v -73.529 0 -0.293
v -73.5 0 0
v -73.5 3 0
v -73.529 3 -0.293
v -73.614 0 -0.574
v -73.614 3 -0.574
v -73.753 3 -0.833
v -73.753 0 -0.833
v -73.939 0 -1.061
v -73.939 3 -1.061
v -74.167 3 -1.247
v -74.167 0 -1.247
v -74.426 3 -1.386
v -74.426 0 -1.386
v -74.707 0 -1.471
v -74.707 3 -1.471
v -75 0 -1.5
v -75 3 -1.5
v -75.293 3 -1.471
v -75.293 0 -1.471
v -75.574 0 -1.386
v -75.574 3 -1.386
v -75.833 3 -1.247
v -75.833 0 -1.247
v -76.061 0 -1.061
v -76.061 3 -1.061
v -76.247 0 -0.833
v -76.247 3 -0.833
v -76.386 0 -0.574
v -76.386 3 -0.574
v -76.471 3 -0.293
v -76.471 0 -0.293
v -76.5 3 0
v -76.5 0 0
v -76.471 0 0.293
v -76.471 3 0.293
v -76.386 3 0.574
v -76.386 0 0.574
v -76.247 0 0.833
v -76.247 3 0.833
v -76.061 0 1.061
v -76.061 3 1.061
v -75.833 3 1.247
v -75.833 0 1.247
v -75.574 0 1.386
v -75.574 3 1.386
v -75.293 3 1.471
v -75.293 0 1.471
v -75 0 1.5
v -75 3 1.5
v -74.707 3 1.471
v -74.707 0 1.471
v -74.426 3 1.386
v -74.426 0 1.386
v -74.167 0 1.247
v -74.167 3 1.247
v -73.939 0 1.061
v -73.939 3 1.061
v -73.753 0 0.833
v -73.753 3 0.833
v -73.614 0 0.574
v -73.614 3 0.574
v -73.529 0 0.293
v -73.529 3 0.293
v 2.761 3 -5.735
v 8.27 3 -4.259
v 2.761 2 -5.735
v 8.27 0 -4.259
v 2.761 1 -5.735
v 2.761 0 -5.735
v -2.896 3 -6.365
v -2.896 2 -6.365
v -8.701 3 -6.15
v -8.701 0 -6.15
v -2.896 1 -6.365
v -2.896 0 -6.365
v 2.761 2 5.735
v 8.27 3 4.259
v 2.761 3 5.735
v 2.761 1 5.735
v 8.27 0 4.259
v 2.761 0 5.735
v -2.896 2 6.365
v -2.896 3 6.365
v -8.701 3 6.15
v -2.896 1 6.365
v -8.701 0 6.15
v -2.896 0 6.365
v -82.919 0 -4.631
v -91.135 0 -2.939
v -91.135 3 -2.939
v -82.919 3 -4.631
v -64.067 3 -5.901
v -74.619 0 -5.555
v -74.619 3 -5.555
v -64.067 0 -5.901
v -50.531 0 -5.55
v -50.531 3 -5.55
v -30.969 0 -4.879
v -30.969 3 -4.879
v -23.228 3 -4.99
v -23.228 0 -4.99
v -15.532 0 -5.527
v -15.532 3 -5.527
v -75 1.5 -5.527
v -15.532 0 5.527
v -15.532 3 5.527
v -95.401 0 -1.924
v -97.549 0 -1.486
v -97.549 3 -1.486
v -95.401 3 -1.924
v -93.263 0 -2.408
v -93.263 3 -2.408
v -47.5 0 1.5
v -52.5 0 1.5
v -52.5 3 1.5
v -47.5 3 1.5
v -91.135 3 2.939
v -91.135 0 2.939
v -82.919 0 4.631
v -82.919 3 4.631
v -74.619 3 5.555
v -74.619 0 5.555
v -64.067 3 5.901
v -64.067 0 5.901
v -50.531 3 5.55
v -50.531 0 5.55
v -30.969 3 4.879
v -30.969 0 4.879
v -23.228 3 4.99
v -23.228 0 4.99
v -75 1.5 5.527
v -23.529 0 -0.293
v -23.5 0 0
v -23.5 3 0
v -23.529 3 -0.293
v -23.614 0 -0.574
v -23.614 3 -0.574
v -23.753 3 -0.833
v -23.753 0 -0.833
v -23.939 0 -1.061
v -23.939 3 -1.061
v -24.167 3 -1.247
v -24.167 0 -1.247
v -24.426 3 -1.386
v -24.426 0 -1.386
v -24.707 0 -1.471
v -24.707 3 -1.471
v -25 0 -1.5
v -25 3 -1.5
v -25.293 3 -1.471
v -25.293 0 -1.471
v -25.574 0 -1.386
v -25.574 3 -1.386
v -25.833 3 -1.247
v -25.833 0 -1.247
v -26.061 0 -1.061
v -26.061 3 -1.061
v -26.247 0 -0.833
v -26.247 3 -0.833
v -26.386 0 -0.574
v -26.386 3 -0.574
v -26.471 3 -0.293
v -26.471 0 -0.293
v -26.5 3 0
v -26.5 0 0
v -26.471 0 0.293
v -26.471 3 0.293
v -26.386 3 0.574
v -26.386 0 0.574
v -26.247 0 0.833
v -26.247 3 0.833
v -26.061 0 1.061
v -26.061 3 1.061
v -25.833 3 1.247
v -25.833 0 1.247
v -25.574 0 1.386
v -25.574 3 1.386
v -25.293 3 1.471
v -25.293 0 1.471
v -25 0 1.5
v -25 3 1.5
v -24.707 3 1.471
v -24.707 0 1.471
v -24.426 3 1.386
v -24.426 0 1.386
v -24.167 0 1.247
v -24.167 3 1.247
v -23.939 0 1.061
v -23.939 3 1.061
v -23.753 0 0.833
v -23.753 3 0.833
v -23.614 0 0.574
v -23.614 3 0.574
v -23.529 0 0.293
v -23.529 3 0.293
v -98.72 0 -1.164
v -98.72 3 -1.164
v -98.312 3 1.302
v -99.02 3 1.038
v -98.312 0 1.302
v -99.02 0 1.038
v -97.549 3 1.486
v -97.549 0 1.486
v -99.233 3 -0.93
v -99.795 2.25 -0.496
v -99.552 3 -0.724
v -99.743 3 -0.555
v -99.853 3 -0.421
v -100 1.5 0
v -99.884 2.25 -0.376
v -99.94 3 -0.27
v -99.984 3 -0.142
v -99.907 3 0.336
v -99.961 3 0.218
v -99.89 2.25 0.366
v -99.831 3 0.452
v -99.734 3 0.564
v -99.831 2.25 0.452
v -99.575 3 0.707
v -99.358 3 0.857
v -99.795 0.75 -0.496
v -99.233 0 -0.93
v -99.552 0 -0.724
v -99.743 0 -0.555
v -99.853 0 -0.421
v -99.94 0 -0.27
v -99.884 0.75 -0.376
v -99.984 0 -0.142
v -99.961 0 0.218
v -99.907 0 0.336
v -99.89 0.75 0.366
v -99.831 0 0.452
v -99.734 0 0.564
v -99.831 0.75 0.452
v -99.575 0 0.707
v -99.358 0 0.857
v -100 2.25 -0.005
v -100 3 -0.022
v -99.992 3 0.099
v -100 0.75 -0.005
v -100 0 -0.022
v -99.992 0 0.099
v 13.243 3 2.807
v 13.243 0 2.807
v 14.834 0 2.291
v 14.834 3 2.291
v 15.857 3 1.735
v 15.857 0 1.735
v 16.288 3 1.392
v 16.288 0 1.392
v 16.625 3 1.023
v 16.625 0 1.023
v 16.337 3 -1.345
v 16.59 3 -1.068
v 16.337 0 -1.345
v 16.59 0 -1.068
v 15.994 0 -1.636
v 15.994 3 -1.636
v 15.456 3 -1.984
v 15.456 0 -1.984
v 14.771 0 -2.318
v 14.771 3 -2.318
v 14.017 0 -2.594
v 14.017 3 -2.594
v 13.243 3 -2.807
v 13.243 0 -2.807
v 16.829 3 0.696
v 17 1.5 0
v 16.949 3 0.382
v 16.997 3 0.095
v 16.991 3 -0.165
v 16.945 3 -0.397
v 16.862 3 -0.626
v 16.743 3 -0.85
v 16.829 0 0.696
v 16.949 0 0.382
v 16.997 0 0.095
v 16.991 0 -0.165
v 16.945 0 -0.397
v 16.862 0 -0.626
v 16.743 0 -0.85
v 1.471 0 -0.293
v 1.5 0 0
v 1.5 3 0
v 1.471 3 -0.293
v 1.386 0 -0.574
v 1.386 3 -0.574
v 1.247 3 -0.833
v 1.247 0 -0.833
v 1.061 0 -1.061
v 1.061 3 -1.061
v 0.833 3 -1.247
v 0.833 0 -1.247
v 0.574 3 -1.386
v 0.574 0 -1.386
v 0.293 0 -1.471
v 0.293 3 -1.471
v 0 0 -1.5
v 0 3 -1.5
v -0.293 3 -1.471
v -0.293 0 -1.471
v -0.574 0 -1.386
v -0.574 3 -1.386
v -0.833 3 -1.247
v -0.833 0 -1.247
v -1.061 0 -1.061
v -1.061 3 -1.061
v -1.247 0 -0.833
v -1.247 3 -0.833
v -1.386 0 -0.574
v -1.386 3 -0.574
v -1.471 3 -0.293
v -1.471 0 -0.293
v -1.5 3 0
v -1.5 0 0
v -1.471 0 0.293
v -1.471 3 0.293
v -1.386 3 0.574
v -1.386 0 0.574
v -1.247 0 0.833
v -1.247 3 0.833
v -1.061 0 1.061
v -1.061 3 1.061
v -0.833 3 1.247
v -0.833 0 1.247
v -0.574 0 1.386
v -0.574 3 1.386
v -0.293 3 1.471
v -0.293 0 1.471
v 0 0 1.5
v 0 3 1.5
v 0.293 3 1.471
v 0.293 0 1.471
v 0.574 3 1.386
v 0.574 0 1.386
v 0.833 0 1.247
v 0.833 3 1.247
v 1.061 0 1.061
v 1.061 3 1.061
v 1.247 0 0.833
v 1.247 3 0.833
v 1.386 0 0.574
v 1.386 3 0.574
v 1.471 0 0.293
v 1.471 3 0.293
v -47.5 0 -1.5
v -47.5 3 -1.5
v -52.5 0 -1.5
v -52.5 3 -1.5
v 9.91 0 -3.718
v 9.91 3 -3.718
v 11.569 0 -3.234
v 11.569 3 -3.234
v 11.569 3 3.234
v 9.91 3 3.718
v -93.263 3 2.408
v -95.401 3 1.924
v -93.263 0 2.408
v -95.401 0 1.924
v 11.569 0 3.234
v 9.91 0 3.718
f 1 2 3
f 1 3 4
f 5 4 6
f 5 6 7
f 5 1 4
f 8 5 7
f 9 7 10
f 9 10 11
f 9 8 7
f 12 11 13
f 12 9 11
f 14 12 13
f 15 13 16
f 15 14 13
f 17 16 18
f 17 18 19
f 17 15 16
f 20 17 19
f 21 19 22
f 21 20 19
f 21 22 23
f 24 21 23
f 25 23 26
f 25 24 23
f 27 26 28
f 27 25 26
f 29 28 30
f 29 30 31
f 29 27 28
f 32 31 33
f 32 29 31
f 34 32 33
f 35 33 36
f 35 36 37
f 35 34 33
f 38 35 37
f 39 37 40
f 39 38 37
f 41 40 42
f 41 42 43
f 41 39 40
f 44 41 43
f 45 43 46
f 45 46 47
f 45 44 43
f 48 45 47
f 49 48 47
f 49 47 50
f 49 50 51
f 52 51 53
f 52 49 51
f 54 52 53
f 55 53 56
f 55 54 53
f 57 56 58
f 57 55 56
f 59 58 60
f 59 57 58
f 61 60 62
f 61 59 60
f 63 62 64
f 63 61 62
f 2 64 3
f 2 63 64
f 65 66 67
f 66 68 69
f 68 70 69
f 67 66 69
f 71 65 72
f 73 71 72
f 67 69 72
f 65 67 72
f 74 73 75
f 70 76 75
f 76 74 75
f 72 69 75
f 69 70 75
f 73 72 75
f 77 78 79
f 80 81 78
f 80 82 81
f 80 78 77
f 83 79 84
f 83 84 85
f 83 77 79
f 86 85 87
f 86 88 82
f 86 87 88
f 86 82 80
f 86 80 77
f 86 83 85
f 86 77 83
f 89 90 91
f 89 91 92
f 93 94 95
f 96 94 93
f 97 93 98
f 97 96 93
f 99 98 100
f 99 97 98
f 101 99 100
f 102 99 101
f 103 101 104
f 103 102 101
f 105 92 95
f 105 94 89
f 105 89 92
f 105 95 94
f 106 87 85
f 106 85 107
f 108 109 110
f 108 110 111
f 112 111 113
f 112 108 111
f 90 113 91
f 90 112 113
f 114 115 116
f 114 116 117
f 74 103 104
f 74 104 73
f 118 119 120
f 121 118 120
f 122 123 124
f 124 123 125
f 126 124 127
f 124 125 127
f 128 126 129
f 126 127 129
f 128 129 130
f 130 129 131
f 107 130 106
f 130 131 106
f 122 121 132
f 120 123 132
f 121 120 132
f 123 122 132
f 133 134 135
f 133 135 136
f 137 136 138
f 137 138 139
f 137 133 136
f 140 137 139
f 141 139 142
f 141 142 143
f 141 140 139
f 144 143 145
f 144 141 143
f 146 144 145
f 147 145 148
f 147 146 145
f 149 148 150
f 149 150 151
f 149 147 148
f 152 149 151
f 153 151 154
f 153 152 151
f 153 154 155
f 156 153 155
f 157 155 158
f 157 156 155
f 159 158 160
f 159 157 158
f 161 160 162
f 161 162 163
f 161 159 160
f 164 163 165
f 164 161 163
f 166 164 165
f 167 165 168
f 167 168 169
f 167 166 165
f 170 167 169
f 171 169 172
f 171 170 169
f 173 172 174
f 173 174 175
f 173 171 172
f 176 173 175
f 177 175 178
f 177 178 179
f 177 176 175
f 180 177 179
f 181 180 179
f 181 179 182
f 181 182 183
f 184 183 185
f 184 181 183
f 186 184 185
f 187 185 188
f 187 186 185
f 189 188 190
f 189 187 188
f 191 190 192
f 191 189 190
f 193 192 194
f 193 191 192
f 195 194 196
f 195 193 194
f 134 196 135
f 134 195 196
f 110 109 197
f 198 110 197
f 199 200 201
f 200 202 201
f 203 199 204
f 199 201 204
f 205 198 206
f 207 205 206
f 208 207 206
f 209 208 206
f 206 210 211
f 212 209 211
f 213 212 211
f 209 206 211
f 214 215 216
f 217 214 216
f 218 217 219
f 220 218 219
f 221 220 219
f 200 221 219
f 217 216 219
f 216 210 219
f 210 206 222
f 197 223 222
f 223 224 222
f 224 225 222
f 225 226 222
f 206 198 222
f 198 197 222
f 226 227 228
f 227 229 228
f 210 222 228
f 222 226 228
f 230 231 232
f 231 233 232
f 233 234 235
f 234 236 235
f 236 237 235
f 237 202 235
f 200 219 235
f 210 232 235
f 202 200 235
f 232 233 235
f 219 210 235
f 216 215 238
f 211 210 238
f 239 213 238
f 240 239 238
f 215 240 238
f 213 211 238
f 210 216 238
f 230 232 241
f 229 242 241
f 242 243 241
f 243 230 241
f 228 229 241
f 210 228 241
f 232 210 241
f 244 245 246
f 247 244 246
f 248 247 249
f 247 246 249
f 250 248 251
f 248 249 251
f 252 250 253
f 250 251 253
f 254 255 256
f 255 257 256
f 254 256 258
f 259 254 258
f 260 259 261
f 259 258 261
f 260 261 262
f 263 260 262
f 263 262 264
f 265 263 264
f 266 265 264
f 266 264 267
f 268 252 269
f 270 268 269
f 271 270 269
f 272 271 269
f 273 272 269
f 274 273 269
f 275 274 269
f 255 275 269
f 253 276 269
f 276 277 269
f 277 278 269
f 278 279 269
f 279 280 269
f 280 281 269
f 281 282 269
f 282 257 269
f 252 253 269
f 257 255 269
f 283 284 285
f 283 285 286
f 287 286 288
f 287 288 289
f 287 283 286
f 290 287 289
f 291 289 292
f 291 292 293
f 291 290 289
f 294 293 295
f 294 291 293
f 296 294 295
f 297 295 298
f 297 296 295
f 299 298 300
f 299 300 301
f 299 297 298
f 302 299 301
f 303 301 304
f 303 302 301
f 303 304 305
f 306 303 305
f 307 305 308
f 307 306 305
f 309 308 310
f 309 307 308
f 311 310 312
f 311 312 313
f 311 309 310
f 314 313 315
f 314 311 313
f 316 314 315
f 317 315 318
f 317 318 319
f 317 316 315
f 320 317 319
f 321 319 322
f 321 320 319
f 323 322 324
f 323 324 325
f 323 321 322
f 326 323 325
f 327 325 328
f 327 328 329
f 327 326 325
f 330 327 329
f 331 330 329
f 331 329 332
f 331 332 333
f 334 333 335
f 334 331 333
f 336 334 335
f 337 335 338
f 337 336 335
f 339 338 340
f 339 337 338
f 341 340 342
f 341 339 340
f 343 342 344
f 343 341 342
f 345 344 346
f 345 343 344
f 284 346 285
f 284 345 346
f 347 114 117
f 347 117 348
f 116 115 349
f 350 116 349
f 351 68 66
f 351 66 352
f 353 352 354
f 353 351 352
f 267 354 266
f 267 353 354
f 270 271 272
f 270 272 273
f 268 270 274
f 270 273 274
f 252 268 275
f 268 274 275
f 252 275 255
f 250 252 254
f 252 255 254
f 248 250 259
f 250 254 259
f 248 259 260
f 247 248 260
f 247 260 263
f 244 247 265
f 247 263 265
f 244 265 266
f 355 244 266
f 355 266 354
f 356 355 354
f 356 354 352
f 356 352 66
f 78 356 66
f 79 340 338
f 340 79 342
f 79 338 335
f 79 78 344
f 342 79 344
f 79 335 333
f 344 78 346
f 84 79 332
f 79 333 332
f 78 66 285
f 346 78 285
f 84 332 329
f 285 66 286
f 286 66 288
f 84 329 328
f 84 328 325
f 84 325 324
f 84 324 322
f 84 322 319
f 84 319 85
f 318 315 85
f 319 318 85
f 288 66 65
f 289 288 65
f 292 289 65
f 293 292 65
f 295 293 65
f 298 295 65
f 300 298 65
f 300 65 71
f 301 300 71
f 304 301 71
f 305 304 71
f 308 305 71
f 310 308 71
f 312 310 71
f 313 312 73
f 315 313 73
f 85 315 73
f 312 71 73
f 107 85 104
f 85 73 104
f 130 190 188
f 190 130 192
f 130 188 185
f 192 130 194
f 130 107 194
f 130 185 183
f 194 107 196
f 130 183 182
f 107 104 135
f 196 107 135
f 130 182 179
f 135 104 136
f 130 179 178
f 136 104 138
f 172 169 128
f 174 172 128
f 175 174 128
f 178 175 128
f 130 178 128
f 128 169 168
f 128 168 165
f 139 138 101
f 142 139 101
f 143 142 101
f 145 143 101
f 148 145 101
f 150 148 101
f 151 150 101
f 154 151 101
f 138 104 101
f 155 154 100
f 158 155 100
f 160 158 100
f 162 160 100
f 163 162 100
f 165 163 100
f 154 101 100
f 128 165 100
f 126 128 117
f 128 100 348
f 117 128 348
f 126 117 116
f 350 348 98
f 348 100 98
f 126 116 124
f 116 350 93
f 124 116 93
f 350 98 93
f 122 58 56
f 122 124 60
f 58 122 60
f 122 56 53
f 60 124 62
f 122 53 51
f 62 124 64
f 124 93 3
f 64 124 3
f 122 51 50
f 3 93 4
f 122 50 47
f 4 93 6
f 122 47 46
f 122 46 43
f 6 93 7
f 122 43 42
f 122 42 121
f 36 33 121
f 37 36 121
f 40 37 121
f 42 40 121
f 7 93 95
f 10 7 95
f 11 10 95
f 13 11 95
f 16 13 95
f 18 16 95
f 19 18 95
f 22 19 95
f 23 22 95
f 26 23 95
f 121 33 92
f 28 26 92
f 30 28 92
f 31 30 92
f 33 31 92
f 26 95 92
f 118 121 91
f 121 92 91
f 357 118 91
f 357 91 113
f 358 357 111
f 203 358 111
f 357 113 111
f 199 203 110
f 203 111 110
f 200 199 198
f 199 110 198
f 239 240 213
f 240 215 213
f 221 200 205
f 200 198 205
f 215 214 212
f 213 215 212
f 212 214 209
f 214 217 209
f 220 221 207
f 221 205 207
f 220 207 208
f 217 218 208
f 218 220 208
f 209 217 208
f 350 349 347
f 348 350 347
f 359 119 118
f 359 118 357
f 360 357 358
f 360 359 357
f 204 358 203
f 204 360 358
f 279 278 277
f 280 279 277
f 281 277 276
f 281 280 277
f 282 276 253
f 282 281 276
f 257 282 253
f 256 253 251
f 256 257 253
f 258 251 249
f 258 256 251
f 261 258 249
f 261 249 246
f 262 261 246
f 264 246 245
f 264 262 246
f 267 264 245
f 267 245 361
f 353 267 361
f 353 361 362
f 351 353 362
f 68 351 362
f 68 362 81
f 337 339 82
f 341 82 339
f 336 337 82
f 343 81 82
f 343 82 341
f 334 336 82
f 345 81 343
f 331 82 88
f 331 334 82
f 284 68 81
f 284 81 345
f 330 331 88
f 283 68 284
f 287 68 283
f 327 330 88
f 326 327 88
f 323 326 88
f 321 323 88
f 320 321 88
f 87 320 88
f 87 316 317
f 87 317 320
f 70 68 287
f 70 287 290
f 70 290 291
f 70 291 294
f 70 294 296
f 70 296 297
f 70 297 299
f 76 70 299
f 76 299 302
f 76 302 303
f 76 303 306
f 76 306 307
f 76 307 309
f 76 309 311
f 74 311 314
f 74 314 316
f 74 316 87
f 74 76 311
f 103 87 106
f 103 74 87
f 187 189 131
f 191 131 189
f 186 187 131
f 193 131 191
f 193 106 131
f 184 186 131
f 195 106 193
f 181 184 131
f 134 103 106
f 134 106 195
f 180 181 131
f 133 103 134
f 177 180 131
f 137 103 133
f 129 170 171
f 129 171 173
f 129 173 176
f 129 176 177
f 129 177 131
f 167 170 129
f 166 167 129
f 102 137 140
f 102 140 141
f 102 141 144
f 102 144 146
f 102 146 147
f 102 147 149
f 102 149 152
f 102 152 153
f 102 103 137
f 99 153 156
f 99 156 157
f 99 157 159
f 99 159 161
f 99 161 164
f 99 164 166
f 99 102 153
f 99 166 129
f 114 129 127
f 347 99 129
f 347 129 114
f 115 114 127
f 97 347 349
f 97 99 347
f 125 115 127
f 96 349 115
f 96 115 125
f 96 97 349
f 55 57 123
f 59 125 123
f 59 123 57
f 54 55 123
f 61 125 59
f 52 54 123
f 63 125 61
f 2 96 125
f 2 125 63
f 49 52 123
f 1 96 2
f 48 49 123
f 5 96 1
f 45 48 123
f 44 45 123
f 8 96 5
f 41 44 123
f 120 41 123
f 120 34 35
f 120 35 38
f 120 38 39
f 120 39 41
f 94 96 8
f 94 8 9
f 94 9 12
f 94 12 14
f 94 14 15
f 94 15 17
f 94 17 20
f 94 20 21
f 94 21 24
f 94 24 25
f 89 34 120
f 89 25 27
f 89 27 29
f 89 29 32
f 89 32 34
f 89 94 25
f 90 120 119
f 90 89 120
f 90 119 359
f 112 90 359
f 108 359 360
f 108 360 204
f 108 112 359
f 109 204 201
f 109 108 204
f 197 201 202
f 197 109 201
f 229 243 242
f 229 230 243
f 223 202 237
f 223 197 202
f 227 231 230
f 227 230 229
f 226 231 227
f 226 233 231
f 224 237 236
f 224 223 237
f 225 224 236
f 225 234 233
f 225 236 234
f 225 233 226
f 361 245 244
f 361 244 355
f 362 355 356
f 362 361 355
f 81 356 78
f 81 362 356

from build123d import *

# Parameters (mm, degrees)
ESBO_O1_R                = 1.5
ESBO_O1_W                = 5
ESBO_O1_H                = 3
RESSALTO_EXTRUS_O1_DEPTH = 3


with BuildPart() as part:
    # Esboço1 → Ressalto-extrusão1 (new body)
    with BuildSketch(Plane(origin=(0, 0, 0), x_dir=(1, 0, 0), z_dir=(0, 1, 0))):
        with BuildLine():
            Line((-15.5324261, 5.526900759), (-8.701477822, 6.15))
            add(Edge.make_bspline(
                [(8.269723742, 4.259468977), (2.834912713, 6.157347241), (-2.82215339, 6.787527354), (-8.701477822, 6.15)],
                knots=[0.35388944, 0.35388944, 0.35388944, 0.35388944, 1, 1, 1, 1], degree=3))
            ThreePointArc((8.269723742, 4.259468977), (10.737611567, 3.46879666), (13.24315076, 2.807051708))
            add(Edge.make_bspline(
                [(13.243153259, -2.80704963), (25.10877849, 2.12e-06), (13.24315076, 2.807051708)],
                knots=[5.194112275, 5.194112275, 5.194112275, 7.372258742, 7.372258742, 7.372258742], degree=2, weights=[1, 0.463306864, 1]))
            ThreePointArc((13.243153259, -2.80704963), (10.737612779, -3.468795552), (8.269723742, -4.259468977))
            add(Edge.make_bspline(
                [(8.269723742, -4.259468977), (2.834913243, -6.15734876), (-2.822153925, -6.787525817), (-8.701477822, -6.15)],
                knots=[0.35388944, 0.35388944, 0.35388944, 0.35388944, 1, 1, 1, 1], degree=3))
            Line((-8.701477822, -6.15), (-15.5324261, -5.526900759))
            add(Edge.make_bspline(
                [(-91.135478662, -2.939356415), (-85.814709071, -4.330378827), (-60.917561227, -7.97508816), (-35.132432713, -3.48955228), (-15.5324261, -5.526900759)],
                knots=[0.107974898, 0.107974898, 0.107974898, 0.107974898, 0.300967181, 1, 1, 1, 1], degree=3))
            ThreePointArc((-91.135478662, -2.939356415), (-94.330524557, -2.159963767), (-97.549471293, -1.486054958))
            add(Edge.make_bspline(
                [(-97.549471293, 1.486054958), (-105.279311729, 0), (-97.549471293, -1.486054958)],
                knots=[5.195092838, 5.195092838, 5.195092838, 7.371277776, 7.371277776, 7.371277776], degree=2, weights=[1, 0.464175793, 1]))
            ThreePointArc((-97.549471293, 1.486054958), (-94.330524557, 2.159963767), (-91.135478662, 2.939356415))
            add(Edge.make_bspline(
                [(-91.135478662, 2.939356415), (-85.814709071, 4.330378827), (-60.917561227, 7.97508816), (-35.132432713, 3.48955228), (-15.5324261, 5.526900759)],
                knots=[0.107974898, 0.107974898, 0.107974898, 0.107974898, 0.300967181, 1, 1, 1, 1], degree=3))
        make_face()
        Circle(ESBO_O1_R, mode=Mode.SUBTRACT)
        with Locations((-75, 0)):
            Circle(ESBO_O1_R, mode=Mode.SUBTRACT)
        with Locations((-25, 0)):
            Circle(ESBO_O1_R, mode=Mode.SUBTRACT)
        with Locations((-50, 0)):
            Rectangle(ESBO_O1_W, ESBO_O1_H, mode=Mode.SUBTRACT)
    extrude(amount=RESSALTO_EXTRUS_O1_DEPTH)


solid = part.part
